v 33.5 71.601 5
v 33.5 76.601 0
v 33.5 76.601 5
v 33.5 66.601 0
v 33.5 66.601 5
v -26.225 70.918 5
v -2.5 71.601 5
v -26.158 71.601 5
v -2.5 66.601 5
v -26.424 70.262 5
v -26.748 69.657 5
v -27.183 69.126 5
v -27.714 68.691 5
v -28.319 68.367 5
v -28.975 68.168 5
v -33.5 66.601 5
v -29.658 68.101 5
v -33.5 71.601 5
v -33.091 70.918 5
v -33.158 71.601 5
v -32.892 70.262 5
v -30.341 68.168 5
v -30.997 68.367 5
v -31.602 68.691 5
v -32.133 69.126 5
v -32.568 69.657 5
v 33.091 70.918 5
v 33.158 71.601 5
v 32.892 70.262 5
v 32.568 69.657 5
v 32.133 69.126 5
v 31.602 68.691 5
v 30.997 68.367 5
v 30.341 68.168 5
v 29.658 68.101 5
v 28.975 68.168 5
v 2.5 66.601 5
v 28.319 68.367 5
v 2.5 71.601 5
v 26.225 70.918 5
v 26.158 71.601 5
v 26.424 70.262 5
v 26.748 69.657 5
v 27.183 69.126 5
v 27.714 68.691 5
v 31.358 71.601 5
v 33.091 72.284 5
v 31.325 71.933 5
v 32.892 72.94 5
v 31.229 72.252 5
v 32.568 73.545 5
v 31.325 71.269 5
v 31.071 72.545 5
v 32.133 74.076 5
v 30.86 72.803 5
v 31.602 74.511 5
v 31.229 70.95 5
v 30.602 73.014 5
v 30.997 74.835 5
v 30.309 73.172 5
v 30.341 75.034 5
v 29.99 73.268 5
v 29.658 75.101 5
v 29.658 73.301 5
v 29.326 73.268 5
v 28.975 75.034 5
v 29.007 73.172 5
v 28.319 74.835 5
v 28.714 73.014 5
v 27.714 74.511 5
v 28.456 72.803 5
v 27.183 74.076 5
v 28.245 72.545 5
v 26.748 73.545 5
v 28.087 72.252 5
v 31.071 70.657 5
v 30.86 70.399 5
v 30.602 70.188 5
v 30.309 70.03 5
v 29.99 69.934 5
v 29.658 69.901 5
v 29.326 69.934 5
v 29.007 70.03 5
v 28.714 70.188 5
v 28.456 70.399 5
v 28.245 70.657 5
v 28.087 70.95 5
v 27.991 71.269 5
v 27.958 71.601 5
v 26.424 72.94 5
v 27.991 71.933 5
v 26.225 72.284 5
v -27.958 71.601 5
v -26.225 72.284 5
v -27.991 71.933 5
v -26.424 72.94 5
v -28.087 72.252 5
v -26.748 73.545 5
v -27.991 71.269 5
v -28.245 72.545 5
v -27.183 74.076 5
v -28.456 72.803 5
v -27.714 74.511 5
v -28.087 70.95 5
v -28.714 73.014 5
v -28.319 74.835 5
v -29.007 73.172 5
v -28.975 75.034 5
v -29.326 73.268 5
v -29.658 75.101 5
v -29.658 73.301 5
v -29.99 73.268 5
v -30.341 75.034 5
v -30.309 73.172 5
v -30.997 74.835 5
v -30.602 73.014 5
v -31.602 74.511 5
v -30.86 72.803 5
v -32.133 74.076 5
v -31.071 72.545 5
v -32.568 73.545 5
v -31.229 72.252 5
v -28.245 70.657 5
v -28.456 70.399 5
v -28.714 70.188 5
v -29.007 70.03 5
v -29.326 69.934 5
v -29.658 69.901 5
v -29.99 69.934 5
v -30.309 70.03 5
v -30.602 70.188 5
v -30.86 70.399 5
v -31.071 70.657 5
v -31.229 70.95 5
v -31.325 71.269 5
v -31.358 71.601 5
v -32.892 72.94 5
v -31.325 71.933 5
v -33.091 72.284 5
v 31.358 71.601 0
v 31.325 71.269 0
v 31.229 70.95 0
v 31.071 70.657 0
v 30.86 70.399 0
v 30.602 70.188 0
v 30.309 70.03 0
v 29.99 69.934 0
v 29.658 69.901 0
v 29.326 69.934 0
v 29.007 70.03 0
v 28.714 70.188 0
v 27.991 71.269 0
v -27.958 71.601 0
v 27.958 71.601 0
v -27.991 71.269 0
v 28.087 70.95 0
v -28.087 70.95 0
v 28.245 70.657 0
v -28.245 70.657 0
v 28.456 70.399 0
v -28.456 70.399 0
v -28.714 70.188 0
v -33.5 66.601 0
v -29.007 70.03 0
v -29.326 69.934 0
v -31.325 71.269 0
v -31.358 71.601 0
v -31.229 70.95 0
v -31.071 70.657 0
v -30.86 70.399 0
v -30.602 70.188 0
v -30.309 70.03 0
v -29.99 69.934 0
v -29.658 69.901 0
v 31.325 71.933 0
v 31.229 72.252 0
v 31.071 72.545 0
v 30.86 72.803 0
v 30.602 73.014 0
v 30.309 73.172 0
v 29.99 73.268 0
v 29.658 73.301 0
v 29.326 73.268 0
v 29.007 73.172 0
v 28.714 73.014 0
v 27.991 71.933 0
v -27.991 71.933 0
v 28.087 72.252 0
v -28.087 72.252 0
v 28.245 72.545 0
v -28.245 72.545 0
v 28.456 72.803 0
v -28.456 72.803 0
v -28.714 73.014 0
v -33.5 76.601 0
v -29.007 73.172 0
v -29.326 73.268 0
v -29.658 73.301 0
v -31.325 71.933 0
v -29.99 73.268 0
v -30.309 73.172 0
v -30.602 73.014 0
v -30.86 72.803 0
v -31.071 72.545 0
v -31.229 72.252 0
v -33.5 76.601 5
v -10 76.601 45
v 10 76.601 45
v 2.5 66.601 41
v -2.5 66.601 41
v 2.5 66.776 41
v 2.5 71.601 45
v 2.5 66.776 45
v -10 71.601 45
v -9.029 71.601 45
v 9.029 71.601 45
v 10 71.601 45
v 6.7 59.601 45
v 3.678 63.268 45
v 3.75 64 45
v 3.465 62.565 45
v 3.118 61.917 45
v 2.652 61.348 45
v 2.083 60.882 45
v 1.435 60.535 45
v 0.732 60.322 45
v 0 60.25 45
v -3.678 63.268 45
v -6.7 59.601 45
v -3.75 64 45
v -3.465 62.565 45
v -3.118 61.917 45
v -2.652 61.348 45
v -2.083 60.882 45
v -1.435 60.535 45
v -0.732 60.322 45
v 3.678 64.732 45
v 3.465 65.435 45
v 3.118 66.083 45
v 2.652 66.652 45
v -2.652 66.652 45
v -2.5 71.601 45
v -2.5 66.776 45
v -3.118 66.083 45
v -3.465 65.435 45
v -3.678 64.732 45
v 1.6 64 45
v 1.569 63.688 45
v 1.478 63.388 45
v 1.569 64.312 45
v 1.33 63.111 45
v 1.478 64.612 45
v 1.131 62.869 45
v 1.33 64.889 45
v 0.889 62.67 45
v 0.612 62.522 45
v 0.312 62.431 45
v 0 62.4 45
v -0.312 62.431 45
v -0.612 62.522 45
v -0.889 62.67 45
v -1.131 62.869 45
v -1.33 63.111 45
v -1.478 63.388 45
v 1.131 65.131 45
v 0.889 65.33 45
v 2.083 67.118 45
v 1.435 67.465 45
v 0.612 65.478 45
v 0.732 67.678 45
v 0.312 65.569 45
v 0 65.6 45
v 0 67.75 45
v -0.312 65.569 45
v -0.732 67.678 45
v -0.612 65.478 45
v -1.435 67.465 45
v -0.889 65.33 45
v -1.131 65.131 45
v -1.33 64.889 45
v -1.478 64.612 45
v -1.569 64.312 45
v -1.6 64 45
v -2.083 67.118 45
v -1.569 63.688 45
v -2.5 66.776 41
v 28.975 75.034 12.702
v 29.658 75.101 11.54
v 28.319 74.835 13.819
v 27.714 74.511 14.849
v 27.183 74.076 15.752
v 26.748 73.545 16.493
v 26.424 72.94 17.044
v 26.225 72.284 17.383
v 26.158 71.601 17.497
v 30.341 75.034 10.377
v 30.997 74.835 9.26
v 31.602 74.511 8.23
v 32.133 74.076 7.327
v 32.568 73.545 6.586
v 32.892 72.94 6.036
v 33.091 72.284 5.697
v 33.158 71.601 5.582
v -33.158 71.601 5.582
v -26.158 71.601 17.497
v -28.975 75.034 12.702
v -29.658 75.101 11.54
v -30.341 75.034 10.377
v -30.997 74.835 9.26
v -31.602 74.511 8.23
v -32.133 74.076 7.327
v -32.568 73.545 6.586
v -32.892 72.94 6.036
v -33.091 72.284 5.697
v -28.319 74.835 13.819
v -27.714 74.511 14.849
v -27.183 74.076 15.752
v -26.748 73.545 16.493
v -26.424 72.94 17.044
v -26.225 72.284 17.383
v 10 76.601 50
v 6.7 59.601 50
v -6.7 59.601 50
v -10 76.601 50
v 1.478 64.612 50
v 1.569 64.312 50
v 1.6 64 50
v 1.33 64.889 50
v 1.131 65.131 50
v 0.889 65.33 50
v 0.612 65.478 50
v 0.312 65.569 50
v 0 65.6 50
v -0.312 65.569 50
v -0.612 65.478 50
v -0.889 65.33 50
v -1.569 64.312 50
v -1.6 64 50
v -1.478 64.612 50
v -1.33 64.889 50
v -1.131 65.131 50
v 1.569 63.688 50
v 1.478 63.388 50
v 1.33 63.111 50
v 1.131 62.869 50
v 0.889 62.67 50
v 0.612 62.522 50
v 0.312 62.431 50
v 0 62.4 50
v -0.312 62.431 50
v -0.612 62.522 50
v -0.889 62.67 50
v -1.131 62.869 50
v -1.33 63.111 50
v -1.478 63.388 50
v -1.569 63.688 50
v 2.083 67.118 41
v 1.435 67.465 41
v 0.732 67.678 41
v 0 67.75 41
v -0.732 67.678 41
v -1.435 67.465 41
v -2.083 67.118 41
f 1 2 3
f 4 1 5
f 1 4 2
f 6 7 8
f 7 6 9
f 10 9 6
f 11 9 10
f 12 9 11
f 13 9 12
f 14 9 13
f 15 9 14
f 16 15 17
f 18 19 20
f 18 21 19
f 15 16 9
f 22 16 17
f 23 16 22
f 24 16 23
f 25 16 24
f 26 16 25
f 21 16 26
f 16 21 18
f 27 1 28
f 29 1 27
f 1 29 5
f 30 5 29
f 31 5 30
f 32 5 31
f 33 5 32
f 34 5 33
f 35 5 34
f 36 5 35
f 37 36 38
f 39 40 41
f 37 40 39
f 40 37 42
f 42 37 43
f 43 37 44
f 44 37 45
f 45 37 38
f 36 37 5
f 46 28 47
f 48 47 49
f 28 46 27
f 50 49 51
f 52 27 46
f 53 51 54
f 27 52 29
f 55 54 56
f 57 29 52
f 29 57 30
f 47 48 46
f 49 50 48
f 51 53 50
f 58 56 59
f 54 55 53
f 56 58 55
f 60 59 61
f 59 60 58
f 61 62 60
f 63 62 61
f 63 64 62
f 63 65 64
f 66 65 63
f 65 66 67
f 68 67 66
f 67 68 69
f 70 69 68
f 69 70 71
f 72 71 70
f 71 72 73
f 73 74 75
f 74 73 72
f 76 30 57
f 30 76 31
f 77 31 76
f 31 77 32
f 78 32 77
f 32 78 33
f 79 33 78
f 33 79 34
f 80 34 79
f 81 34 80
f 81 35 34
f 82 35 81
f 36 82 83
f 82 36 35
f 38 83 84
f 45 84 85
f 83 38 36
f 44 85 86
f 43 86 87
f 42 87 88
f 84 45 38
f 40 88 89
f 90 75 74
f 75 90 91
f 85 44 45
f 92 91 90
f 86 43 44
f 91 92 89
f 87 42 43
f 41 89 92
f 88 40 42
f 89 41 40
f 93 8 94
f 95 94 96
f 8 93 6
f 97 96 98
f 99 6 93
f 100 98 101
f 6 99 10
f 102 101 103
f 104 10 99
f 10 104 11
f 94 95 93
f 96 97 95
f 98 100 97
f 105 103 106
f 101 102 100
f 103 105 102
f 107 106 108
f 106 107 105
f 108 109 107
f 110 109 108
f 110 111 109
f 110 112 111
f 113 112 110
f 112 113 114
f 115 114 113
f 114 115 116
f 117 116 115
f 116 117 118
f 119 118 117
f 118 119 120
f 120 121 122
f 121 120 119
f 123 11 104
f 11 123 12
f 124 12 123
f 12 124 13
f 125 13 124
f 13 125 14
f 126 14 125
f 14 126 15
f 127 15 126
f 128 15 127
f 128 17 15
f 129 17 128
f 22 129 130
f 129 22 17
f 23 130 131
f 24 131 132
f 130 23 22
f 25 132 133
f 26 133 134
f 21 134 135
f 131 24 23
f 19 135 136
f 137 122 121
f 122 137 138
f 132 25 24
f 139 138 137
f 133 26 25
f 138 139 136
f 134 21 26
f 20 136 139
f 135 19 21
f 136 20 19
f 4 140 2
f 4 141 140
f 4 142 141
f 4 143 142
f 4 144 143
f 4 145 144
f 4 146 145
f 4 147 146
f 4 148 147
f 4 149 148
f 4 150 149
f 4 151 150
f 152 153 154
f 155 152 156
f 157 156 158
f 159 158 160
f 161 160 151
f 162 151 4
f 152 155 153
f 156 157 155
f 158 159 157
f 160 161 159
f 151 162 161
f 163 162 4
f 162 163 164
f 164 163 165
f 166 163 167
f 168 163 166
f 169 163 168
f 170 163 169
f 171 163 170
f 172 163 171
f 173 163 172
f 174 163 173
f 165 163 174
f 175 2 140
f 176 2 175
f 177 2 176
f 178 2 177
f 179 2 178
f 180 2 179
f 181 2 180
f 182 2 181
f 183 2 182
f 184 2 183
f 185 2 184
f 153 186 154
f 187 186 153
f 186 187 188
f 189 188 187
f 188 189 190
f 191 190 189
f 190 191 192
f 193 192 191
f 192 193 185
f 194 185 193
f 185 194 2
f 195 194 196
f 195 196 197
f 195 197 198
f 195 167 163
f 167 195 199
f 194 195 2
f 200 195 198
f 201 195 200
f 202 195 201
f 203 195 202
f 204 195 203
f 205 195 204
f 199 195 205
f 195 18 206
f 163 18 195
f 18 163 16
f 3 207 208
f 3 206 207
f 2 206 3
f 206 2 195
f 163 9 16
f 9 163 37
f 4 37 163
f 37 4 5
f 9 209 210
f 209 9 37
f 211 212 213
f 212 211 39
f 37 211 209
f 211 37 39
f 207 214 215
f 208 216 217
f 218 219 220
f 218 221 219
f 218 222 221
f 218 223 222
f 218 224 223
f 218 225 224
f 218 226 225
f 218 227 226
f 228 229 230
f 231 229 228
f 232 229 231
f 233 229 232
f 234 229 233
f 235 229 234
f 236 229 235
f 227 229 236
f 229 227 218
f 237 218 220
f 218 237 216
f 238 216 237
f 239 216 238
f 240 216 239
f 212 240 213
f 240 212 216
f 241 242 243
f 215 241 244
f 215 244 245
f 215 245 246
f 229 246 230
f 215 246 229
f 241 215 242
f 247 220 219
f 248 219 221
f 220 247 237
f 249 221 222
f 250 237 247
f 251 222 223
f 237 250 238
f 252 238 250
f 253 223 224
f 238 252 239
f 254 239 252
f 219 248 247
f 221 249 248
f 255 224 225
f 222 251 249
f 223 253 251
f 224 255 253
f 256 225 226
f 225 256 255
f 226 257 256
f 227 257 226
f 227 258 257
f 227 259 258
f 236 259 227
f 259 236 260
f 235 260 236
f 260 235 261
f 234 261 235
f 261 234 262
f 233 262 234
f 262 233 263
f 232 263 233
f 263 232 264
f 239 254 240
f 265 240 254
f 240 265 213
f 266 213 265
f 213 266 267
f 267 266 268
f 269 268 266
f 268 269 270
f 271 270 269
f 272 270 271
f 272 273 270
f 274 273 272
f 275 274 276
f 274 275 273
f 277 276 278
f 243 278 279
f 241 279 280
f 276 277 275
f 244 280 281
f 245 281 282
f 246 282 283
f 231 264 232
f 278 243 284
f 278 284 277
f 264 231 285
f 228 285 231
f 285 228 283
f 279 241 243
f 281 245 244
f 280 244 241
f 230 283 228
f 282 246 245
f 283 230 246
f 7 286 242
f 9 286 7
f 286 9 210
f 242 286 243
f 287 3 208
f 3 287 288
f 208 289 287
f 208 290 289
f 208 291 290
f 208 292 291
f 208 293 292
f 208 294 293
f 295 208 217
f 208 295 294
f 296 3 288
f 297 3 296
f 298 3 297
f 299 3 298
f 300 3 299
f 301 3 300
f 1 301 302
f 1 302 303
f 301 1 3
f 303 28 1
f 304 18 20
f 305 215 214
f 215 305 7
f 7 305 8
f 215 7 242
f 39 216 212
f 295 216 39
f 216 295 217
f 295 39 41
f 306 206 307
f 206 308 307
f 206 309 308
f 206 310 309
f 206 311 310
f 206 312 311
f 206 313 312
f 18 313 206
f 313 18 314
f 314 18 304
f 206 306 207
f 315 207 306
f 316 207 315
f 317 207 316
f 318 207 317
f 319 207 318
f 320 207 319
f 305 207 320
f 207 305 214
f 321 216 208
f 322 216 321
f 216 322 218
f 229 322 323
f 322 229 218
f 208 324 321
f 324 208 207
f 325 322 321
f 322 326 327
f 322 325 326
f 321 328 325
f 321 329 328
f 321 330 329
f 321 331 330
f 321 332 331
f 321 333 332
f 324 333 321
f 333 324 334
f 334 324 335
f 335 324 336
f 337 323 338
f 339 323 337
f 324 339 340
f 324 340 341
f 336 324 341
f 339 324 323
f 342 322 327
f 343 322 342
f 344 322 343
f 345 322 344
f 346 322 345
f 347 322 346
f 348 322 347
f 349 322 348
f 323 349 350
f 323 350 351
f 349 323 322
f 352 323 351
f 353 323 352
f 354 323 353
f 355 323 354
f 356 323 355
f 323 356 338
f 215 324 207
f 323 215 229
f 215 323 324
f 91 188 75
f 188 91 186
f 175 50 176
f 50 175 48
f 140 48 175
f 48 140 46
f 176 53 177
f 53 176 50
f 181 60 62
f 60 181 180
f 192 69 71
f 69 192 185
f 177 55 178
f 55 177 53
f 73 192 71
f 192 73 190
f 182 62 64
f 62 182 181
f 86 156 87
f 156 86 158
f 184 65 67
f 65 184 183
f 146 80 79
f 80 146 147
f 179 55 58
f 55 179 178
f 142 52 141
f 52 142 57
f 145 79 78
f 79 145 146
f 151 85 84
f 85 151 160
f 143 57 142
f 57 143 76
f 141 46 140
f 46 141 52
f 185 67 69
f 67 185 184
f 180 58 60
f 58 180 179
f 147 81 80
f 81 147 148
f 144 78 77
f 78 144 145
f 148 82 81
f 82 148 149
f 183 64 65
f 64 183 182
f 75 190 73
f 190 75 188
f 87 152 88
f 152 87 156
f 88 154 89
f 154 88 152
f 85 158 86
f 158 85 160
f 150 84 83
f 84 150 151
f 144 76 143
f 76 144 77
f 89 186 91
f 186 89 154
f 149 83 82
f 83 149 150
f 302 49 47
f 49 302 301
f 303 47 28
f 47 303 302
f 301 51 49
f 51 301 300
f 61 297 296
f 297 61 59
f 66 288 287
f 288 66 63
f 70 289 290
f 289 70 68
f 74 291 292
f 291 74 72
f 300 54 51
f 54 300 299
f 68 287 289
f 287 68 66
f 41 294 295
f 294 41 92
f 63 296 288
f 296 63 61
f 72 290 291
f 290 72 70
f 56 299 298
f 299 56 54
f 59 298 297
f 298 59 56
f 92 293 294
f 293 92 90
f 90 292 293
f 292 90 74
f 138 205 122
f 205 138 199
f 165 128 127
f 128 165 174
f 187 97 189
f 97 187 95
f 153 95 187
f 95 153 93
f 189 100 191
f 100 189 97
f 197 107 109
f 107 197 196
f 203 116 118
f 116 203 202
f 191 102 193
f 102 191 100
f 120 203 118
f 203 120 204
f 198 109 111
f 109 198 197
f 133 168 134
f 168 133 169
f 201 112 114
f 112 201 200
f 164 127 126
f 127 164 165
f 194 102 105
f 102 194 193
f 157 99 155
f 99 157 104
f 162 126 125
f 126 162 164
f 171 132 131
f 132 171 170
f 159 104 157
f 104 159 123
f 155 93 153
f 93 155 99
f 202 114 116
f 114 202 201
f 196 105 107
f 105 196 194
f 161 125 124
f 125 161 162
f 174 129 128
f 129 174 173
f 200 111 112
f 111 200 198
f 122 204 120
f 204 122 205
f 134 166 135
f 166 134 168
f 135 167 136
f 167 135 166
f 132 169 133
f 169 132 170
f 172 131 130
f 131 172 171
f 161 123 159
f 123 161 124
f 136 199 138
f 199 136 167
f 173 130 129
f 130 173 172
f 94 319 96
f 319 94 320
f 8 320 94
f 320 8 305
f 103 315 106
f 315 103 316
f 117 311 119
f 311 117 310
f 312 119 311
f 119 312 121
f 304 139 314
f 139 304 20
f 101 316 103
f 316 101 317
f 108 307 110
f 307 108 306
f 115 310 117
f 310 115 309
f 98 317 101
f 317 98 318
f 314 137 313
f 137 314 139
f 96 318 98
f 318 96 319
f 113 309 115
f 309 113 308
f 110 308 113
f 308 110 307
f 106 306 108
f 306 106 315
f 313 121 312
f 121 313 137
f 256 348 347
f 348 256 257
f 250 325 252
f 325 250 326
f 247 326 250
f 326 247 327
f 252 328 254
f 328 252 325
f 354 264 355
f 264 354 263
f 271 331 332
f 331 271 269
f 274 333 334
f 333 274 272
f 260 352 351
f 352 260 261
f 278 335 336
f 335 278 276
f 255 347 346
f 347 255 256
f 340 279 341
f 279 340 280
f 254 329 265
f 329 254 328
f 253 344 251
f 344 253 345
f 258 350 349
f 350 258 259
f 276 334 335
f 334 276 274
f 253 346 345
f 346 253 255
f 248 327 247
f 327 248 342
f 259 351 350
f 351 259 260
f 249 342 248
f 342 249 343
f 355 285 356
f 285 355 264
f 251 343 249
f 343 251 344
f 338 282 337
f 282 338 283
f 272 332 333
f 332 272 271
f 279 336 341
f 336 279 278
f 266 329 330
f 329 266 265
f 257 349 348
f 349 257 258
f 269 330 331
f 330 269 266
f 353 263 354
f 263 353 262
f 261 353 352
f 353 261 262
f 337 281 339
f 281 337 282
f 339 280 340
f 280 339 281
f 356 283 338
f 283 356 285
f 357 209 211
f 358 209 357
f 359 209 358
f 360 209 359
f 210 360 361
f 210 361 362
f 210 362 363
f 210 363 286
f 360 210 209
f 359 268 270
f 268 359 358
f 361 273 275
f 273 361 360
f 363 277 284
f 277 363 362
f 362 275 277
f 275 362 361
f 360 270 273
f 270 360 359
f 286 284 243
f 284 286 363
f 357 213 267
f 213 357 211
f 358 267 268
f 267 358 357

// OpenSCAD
// portal_tee_v3 — v3 屏幕底部支撑 T 型件 (与 build_tee.py 同参, 2026-07-23 终版)。
// 盘系 Z0=承载面; ×2 (第二件绕 Z 转 180°); 平躺打印 (外侧面 Y=76.601 贴床) 零支撑。
// 底横条装转子两颗 M3; 梯形加强壁齐外侧面; 顶平板托梯形 (托面 Z50=屏底), 内边 13.4=屏厚;
// 屏孔 (0,64) M3×12 + Φ7.5×4 帽让位窝; 2×Φ7 工艺井过壁。

bar_x=33.5; bar_h=5; y0=66.601; y1=76.601;      // 底横条 67×10×5
stem_hw=2.5; stem_z1=50;                        // 竖梃 5×10
gus_t=5; gy0=y1-gus_t;                          // 梯形壁厚 5, 齐外侧
pad_t=5; pad_z0=stem_z1-pad_t;                  // 顶托 Z45..50
pad_y0=59.601; pad_wi=6.7; pad_wo=10;           // 托梯形: 内 ±6.7, 外 ±10
foot_holes=[[29.658,71.601],[-29.658,71.601]];
well_d=7; well_z1=20;
scr_y=64;

difference(){
  union(){
    translate([-bar_x,y0,0]) cube([2*bar_x,y1-y0,bar_h]);            // 底横条
    translate([-stem_hw,y0,bar_h]) cube([2*stem_hw,y1-y0,pad_z0-bar_h]); // 竖梃
    translate([0,gy0+gus_t,0]) rotate([90,0,0]) linear_extrude(gus_t)    // 梯形壁
      polygon([[-bar_x,bar_h],[bar_x,bar_h],[pad_wo,pad_z0],[-pad_wo,pad_z0]]);
    translate([0,0,pad_z0]) linear_extrude(pad_t)                        // 顶平板托
      polygon([[pad_wo,y1],[-pad_wo,y1],[-pad_wi,pad_y0],[pad_wi,pad_y0]]);
  }
  for(h=foot_holes){
    translate([h[0],h[1],-1]) cylinder(h=bar_h+2, d=3.4, $fn=32);        // 脚孔
    translate([h[0],h[1],bar_h]) cylinder(h=well_z1-bar_h, d=well_d, $fn=32);  // 工艺井
  }
  translate([0,scr_y,pad_z0-1]) cylinder(h=pad_t+2, d=3.2, $fn=32);      // 屏孔
  translate([0,scr_y,pad_z0-4]) cylinder(h=4, d=7.5, $fn=32);            // 帽让位窝
}
